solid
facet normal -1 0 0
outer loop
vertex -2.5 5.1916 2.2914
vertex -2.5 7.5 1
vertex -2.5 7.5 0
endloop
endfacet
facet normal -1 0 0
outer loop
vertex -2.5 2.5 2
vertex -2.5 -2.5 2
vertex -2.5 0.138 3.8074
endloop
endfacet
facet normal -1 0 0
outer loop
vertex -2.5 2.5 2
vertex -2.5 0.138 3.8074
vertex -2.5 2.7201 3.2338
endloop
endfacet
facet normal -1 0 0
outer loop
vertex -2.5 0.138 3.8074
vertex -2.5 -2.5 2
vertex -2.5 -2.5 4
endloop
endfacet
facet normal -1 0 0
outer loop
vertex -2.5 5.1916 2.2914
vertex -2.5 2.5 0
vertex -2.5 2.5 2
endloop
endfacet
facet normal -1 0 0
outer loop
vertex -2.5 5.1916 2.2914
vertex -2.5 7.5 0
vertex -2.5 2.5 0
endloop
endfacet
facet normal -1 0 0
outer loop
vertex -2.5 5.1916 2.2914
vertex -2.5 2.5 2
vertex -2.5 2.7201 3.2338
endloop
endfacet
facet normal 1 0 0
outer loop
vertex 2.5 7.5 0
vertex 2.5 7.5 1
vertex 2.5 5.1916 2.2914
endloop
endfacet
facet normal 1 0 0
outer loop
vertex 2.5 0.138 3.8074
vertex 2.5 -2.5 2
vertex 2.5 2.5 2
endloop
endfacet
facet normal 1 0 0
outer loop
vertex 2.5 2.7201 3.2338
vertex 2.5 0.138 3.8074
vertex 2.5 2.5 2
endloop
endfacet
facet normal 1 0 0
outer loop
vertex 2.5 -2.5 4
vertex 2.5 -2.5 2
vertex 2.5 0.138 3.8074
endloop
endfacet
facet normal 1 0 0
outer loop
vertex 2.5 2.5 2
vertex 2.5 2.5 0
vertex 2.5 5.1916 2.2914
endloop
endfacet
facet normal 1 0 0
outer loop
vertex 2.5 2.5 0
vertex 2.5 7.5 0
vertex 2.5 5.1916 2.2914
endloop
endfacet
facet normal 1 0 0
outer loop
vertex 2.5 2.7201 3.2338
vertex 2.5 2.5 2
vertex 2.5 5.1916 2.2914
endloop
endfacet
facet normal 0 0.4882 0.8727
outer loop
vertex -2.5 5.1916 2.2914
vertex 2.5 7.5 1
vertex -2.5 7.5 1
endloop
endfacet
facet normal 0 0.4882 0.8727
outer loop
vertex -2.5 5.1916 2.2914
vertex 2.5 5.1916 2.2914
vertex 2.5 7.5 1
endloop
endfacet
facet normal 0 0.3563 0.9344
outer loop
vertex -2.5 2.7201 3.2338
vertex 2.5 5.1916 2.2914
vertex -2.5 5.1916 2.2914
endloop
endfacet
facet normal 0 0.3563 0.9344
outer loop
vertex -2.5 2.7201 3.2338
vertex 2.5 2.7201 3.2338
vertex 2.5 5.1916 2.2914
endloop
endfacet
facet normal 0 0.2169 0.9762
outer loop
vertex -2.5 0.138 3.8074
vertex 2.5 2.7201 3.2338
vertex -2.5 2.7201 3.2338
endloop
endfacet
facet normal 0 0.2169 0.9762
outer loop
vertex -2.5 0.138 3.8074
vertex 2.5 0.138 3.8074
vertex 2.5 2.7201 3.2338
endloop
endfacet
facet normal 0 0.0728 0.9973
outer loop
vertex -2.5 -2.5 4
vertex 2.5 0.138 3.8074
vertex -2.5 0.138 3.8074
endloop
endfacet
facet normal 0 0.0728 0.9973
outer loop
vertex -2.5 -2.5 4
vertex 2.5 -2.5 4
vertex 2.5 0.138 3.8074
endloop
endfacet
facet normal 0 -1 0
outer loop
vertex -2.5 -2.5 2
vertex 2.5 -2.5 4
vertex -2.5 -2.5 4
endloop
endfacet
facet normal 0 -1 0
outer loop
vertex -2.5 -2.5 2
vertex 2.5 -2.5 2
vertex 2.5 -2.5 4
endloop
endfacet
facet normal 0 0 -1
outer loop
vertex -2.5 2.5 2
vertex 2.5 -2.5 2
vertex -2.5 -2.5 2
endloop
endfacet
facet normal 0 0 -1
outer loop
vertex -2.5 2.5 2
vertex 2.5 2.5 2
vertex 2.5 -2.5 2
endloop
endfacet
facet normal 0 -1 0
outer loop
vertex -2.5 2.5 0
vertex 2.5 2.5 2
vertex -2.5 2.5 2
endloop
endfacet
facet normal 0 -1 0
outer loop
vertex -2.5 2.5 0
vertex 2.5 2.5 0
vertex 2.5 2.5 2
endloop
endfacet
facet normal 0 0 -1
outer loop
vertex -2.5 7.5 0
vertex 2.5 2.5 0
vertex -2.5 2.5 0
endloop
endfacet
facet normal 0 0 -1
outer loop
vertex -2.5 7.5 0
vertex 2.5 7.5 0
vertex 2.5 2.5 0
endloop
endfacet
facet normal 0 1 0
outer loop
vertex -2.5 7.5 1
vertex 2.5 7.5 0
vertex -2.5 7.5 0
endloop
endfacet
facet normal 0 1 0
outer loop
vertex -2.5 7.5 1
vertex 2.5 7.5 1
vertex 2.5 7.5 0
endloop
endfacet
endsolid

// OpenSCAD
// plate_bow_1x2

// external vars #########################

ext_scale = 1.0;
ext_fn = 12;

// part ##################################

module plate_bow_1x2(m_scale=ext_scale,m_fn=ext_fn) {
    pts_base = [[10,1],[10,0],[5,0],[5,2],[0,2],[0,4]];
    hyp_bow = sqrt(109);
    r_bow = (hyp_bow/2)/(3/hyp_bow);
    u_bow = r_bow-4;
    ang_bow = (90-acos(3/hyp_bow))*2;
    div = m_fn/3;
    pts_arc = [for (i=[1:div-1]) let (ang = 90-(ang_bow/div)*i) [cos(ang)*r_bow,sin(ang)*r_bow-u_bow]];
    pts = concat(pts_base,pts_arc);
    scale([m_scale,m_scale,m_scale])
    translate([-2.5,-2.5,0]) rotate([0,0,90])
    rotate([90,0,0]) linear_extrude(height=5) polygon(pts);
}

plate_bow_1x2();
